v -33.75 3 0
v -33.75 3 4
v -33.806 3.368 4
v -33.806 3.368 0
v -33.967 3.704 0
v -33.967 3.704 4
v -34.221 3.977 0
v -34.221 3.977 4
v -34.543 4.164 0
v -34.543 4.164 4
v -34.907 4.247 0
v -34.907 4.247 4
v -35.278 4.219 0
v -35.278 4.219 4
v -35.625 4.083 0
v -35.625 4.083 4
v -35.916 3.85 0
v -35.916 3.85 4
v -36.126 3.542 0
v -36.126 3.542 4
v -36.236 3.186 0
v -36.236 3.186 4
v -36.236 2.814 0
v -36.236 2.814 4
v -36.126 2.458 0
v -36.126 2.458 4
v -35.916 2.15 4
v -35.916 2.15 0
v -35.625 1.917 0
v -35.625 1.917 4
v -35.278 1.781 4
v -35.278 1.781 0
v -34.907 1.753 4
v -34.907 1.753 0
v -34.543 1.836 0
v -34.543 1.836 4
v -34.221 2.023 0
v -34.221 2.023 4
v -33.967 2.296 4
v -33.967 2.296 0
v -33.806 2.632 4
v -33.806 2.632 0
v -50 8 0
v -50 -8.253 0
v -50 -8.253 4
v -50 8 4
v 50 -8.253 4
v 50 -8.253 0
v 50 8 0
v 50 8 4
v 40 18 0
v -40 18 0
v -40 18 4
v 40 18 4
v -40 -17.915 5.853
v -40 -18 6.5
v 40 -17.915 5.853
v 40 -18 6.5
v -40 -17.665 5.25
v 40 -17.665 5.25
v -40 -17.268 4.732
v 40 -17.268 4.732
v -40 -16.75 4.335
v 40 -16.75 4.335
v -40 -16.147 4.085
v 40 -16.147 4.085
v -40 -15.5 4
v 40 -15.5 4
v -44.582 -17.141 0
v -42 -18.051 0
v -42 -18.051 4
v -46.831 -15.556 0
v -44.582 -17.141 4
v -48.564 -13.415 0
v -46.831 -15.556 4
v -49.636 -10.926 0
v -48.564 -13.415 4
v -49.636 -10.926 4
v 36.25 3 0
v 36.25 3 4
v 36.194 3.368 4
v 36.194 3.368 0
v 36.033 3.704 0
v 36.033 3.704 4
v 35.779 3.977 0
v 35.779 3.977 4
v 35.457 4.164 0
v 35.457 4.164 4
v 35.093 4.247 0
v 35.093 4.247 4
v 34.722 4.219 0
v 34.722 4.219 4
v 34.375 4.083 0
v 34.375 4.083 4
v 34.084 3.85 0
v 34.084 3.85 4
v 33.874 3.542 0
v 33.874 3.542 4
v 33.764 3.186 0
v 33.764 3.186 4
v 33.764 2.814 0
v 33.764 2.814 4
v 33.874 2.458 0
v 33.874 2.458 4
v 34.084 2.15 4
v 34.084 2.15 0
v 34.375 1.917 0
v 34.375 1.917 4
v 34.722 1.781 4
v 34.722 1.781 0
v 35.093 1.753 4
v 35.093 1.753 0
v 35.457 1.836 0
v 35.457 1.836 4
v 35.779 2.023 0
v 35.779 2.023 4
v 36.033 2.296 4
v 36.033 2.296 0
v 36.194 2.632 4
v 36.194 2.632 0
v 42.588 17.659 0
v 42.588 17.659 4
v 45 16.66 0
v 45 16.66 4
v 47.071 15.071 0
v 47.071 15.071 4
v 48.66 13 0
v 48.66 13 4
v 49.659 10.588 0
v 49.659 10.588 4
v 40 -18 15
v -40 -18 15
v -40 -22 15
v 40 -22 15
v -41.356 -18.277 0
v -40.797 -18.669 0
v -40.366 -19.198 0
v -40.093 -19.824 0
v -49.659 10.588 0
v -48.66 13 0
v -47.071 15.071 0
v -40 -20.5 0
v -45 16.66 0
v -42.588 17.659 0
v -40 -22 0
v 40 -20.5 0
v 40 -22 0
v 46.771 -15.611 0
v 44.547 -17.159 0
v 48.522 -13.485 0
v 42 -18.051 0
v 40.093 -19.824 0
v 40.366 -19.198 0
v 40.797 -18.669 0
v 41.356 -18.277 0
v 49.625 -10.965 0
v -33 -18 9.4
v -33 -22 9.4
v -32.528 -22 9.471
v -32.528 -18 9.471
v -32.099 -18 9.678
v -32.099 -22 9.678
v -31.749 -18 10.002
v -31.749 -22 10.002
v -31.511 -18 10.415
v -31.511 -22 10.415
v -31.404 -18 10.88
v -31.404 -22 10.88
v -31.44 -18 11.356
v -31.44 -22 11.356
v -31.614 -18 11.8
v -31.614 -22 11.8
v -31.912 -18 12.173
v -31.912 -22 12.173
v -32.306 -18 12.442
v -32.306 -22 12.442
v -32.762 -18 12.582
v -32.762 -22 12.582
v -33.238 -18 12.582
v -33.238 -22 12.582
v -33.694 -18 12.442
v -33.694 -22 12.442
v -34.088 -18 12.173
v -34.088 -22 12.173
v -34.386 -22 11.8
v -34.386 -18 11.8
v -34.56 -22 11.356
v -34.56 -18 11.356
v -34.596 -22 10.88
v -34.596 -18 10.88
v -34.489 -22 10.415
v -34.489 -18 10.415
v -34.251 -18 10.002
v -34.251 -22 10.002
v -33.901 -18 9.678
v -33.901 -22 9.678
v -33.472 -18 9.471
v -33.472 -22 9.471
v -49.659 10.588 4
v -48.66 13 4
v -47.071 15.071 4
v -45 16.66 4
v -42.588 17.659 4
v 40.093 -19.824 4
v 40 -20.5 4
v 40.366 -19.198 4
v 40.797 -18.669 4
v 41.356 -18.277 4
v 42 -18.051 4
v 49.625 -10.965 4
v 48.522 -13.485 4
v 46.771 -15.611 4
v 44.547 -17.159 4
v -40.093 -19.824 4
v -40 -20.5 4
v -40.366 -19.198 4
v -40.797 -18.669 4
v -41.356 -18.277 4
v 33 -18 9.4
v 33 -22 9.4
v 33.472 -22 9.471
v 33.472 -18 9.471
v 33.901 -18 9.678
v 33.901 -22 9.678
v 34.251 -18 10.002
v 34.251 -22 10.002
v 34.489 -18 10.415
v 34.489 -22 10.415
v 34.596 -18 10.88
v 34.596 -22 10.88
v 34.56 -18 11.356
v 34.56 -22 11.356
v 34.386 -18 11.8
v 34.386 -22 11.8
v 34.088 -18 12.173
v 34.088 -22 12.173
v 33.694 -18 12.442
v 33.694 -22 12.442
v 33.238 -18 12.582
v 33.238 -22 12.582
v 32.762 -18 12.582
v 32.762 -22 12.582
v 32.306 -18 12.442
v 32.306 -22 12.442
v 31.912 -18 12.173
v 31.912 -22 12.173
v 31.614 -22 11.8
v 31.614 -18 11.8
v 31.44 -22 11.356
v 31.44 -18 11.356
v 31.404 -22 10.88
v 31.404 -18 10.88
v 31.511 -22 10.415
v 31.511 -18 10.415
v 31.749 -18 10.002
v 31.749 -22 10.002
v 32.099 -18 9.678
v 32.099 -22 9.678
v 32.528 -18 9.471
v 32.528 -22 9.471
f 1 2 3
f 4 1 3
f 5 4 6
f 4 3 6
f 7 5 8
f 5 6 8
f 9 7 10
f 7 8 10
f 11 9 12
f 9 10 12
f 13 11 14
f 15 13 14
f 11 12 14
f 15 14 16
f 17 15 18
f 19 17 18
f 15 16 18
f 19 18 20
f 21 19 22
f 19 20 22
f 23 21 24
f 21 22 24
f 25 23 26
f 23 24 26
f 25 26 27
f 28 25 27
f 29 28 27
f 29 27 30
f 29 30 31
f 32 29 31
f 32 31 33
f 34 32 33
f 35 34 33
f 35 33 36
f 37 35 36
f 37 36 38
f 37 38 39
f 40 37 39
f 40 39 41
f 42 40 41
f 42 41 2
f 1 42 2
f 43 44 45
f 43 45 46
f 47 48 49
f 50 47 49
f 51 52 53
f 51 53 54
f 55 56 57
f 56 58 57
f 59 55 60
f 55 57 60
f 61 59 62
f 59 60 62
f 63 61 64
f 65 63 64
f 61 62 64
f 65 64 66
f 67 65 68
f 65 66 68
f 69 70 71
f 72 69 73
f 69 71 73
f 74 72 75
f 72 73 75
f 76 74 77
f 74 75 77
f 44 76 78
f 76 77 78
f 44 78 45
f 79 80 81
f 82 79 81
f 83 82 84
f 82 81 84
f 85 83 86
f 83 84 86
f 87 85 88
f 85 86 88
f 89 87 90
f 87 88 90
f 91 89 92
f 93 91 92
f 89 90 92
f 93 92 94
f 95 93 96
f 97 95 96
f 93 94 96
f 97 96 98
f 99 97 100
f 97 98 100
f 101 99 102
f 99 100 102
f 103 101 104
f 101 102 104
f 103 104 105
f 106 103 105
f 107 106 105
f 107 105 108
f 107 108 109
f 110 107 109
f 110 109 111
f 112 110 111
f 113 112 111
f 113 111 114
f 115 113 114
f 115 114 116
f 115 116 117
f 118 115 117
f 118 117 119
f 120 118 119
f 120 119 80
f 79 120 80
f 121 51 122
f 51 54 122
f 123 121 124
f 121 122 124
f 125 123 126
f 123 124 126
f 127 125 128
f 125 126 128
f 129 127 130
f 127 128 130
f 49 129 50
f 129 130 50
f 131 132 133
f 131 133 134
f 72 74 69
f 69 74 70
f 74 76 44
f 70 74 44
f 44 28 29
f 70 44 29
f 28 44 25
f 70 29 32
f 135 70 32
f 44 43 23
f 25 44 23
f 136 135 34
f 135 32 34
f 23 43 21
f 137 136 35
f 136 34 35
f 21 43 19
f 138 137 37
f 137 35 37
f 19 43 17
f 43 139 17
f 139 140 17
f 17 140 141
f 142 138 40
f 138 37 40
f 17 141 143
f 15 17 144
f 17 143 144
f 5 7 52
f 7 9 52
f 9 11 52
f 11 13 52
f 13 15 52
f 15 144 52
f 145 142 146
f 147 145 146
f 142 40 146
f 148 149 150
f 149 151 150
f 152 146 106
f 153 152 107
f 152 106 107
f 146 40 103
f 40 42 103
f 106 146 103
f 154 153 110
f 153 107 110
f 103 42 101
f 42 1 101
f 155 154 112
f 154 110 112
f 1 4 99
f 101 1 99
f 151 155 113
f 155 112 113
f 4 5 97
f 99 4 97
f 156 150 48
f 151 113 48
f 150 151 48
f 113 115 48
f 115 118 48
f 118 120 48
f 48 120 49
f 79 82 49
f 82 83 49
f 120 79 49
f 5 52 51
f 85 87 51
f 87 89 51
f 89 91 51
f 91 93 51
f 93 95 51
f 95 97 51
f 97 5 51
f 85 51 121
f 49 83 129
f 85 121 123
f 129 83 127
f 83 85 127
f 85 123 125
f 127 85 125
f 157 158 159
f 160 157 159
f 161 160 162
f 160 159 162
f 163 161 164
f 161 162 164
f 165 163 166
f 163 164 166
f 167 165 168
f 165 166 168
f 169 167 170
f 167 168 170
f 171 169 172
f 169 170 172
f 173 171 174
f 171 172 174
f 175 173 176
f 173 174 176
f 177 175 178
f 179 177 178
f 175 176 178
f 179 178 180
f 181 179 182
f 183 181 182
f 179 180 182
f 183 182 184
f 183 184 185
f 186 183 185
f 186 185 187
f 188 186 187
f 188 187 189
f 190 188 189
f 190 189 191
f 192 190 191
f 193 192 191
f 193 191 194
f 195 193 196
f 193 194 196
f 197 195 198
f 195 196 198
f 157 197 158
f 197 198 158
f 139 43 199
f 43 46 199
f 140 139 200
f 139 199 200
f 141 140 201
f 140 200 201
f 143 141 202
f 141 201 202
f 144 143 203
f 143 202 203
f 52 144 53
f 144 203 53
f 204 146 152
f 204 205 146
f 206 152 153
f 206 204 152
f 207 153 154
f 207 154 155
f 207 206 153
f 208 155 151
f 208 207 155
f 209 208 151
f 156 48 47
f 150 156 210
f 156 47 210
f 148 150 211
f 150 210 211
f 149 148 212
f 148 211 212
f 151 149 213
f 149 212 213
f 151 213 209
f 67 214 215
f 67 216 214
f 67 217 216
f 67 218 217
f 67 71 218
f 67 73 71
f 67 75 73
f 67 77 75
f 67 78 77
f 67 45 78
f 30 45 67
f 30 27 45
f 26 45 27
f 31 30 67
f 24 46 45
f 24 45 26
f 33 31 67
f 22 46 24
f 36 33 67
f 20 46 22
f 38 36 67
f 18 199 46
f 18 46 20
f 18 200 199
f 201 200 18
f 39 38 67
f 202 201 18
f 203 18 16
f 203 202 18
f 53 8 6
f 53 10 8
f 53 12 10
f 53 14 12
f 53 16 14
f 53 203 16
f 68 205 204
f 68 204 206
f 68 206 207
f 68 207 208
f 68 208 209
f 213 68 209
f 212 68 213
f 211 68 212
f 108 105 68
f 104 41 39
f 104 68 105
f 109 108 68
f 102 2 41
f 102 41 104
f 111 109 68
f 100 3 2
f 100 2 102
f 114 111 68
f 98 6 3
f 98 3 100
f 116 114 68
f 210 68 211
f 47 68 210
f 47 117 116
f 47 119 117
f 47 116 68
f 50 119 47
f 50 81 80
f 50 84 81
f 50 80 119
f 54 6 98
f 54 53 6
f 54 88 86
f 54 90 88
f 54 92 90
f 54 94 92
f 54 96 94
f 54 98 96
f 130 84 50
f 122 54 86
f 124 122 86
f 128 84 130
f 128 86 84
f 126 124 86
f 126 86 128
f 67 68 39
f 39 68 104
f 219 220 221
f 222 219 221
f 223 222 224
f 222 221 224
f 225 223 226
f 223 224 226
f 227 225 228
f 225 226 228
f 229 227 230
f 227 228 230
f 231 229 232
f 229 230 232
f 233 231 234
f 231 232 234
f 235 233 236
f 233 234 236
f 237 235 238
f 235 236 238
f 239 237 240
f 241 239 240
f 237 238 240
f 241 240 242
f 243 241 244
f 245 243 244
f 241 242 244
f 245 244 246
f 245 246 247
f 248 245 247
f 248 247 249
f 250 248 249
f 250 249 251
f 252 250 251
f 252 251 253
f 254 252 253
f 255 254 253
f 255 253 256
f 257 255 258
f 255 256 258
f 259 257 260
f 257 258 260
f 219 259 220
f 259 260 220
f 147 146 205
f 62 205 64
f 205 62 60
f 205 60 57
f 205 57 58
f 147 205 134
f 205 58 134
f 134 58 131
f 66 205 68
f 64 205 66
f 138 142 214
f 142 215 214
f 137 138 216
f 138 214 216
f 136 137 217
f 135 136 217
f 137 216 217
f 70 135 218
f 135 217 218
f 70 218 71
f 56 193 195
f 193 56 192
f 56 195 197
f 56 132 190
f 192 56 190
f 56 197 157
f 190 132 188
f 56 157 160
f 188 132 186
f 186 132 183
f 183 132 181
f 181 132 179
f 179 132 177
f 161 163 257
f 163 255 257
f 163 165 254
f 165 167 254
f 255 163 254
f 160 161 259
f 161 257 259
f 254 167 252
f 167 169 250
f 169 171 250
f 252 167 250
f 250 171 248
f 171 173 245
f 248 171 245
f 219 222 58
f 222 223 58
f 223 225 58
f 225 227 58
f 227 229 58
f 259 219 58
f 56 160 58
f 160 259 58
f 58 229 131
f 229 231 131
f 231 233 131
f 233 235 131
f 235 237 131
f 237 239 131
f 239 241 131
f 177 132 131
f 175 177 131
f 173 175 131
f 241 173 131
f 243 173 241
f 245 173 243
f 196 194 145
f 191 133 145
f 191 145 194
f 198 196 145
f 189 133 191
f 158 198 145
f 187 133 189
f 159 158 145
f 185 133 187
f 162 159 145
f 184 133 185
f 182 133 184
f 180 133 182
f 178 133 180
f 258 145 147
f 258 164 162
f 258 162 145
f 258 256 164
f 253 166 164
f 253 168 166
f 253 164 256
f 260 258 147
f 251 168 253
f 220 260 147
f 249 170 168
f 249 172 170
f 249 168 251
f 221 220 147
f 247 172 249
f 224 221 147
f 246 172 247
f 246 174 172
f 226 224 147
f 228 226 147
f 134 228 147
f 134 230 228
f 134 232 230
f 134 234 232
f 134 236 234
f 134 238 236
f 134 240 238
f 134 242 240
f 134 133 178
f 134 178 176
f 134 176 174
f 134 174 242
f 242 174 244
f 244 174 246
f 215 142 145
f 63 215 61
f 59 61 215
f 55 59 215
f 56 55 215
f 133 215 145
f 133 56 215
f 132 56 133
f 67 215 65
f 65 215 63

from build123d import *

# Parameters (mm, degrees)
SKETCH1_W           = 100
SKETCH1_H           = 36
BOSS_EXTRUDE1_DEPTH = 4
SKETCH5_W           = 80
SKETCH5_H           = 15
BOSS_EXTRUDE3_DEPTH = 4
SKETCH6_R           = 1.25
CUT_EXTRUDE3_DEPTH  = 56.722526863
FILLET3_R           = 2.5
FILLET4_R           = 2.5
FILLET5_R           = 10
SKETCH7_R           = 1.6
CUT_EXTRUDE4_DEPTH  = 4


with BuildPart() as part:
    # Sketch1 → Boss-Extrude1 (new body)
    with BuildSketch(Plane.XY):
        Rectangle(SKETCH1_W, SKETCH1_H)
    extrude(amount=BOSS_EXTRUDE1_DEPTH)

    # Sketch5 → Boss-Extrude3 (add)
    with BuildSketch(Plane.XZ.offset(18)):
        with Locations((0, 7.5)):
            Rectangle(SKETCH5_W, SKETCH5_H)
    extrude(amount=BOSS_EXTRUDE3_DEPTH)

    # Sketch6 → Cut-Extrude3 (cut, through all)
    with BuildSketch(Plane.XY.offset(4)):
        with Locations((35, 3)):
            Circle(SKETCH6_R)
        with Locations((-35, 3)):
            Circle(SKETCH6_R)
    extrude(amount=-CUT_EXTRUDE3_DEPTH, mode=Mode.SUBTRACT)

    # Fillet3
    fillet3_edges = [part.edges().sort_by_distance(p)[0] for p in [
        (0, -18, 4),
    ]]
    fillet(fillet3_edges, radius=FILLET3_R)

    # Fillet4
    fillet4_edges = [part.edges().sort_by_distance(p)[0] for p in [
        (-40, -18, 2),
        (40, -18, 2),
    ]]
    fillet(fillet4_edges, radius=FILLET4_R)

    # Fillet5
    fillet5_edges = [part.edges().sort_by_distance(p)[0] for p in [
        (-50, -18, 2),
        (50, -18, 2),
        (-50, 18, 2),
        (50, 18, 2),
    ]]
    fillet(fillet5_edges, radius=FILLET5_R)

    # Sketch7 → Cut-Extrude4 (cut)
    with BuildSketch(Plane.XZ.offset(22)):
        with Locations(Location((33, 11, 0), (0, 0, 270))):
            Circle(SKETCH7_R)
        with Locations(Location((-33, 11, 0), (0, 0, 270))):
            Circle(SKETCH7_R)
    extrude(amount=-CUT_EXTRUDE4_DEPTH, mode=Mode.SUBTRACT)


solid = part.part
